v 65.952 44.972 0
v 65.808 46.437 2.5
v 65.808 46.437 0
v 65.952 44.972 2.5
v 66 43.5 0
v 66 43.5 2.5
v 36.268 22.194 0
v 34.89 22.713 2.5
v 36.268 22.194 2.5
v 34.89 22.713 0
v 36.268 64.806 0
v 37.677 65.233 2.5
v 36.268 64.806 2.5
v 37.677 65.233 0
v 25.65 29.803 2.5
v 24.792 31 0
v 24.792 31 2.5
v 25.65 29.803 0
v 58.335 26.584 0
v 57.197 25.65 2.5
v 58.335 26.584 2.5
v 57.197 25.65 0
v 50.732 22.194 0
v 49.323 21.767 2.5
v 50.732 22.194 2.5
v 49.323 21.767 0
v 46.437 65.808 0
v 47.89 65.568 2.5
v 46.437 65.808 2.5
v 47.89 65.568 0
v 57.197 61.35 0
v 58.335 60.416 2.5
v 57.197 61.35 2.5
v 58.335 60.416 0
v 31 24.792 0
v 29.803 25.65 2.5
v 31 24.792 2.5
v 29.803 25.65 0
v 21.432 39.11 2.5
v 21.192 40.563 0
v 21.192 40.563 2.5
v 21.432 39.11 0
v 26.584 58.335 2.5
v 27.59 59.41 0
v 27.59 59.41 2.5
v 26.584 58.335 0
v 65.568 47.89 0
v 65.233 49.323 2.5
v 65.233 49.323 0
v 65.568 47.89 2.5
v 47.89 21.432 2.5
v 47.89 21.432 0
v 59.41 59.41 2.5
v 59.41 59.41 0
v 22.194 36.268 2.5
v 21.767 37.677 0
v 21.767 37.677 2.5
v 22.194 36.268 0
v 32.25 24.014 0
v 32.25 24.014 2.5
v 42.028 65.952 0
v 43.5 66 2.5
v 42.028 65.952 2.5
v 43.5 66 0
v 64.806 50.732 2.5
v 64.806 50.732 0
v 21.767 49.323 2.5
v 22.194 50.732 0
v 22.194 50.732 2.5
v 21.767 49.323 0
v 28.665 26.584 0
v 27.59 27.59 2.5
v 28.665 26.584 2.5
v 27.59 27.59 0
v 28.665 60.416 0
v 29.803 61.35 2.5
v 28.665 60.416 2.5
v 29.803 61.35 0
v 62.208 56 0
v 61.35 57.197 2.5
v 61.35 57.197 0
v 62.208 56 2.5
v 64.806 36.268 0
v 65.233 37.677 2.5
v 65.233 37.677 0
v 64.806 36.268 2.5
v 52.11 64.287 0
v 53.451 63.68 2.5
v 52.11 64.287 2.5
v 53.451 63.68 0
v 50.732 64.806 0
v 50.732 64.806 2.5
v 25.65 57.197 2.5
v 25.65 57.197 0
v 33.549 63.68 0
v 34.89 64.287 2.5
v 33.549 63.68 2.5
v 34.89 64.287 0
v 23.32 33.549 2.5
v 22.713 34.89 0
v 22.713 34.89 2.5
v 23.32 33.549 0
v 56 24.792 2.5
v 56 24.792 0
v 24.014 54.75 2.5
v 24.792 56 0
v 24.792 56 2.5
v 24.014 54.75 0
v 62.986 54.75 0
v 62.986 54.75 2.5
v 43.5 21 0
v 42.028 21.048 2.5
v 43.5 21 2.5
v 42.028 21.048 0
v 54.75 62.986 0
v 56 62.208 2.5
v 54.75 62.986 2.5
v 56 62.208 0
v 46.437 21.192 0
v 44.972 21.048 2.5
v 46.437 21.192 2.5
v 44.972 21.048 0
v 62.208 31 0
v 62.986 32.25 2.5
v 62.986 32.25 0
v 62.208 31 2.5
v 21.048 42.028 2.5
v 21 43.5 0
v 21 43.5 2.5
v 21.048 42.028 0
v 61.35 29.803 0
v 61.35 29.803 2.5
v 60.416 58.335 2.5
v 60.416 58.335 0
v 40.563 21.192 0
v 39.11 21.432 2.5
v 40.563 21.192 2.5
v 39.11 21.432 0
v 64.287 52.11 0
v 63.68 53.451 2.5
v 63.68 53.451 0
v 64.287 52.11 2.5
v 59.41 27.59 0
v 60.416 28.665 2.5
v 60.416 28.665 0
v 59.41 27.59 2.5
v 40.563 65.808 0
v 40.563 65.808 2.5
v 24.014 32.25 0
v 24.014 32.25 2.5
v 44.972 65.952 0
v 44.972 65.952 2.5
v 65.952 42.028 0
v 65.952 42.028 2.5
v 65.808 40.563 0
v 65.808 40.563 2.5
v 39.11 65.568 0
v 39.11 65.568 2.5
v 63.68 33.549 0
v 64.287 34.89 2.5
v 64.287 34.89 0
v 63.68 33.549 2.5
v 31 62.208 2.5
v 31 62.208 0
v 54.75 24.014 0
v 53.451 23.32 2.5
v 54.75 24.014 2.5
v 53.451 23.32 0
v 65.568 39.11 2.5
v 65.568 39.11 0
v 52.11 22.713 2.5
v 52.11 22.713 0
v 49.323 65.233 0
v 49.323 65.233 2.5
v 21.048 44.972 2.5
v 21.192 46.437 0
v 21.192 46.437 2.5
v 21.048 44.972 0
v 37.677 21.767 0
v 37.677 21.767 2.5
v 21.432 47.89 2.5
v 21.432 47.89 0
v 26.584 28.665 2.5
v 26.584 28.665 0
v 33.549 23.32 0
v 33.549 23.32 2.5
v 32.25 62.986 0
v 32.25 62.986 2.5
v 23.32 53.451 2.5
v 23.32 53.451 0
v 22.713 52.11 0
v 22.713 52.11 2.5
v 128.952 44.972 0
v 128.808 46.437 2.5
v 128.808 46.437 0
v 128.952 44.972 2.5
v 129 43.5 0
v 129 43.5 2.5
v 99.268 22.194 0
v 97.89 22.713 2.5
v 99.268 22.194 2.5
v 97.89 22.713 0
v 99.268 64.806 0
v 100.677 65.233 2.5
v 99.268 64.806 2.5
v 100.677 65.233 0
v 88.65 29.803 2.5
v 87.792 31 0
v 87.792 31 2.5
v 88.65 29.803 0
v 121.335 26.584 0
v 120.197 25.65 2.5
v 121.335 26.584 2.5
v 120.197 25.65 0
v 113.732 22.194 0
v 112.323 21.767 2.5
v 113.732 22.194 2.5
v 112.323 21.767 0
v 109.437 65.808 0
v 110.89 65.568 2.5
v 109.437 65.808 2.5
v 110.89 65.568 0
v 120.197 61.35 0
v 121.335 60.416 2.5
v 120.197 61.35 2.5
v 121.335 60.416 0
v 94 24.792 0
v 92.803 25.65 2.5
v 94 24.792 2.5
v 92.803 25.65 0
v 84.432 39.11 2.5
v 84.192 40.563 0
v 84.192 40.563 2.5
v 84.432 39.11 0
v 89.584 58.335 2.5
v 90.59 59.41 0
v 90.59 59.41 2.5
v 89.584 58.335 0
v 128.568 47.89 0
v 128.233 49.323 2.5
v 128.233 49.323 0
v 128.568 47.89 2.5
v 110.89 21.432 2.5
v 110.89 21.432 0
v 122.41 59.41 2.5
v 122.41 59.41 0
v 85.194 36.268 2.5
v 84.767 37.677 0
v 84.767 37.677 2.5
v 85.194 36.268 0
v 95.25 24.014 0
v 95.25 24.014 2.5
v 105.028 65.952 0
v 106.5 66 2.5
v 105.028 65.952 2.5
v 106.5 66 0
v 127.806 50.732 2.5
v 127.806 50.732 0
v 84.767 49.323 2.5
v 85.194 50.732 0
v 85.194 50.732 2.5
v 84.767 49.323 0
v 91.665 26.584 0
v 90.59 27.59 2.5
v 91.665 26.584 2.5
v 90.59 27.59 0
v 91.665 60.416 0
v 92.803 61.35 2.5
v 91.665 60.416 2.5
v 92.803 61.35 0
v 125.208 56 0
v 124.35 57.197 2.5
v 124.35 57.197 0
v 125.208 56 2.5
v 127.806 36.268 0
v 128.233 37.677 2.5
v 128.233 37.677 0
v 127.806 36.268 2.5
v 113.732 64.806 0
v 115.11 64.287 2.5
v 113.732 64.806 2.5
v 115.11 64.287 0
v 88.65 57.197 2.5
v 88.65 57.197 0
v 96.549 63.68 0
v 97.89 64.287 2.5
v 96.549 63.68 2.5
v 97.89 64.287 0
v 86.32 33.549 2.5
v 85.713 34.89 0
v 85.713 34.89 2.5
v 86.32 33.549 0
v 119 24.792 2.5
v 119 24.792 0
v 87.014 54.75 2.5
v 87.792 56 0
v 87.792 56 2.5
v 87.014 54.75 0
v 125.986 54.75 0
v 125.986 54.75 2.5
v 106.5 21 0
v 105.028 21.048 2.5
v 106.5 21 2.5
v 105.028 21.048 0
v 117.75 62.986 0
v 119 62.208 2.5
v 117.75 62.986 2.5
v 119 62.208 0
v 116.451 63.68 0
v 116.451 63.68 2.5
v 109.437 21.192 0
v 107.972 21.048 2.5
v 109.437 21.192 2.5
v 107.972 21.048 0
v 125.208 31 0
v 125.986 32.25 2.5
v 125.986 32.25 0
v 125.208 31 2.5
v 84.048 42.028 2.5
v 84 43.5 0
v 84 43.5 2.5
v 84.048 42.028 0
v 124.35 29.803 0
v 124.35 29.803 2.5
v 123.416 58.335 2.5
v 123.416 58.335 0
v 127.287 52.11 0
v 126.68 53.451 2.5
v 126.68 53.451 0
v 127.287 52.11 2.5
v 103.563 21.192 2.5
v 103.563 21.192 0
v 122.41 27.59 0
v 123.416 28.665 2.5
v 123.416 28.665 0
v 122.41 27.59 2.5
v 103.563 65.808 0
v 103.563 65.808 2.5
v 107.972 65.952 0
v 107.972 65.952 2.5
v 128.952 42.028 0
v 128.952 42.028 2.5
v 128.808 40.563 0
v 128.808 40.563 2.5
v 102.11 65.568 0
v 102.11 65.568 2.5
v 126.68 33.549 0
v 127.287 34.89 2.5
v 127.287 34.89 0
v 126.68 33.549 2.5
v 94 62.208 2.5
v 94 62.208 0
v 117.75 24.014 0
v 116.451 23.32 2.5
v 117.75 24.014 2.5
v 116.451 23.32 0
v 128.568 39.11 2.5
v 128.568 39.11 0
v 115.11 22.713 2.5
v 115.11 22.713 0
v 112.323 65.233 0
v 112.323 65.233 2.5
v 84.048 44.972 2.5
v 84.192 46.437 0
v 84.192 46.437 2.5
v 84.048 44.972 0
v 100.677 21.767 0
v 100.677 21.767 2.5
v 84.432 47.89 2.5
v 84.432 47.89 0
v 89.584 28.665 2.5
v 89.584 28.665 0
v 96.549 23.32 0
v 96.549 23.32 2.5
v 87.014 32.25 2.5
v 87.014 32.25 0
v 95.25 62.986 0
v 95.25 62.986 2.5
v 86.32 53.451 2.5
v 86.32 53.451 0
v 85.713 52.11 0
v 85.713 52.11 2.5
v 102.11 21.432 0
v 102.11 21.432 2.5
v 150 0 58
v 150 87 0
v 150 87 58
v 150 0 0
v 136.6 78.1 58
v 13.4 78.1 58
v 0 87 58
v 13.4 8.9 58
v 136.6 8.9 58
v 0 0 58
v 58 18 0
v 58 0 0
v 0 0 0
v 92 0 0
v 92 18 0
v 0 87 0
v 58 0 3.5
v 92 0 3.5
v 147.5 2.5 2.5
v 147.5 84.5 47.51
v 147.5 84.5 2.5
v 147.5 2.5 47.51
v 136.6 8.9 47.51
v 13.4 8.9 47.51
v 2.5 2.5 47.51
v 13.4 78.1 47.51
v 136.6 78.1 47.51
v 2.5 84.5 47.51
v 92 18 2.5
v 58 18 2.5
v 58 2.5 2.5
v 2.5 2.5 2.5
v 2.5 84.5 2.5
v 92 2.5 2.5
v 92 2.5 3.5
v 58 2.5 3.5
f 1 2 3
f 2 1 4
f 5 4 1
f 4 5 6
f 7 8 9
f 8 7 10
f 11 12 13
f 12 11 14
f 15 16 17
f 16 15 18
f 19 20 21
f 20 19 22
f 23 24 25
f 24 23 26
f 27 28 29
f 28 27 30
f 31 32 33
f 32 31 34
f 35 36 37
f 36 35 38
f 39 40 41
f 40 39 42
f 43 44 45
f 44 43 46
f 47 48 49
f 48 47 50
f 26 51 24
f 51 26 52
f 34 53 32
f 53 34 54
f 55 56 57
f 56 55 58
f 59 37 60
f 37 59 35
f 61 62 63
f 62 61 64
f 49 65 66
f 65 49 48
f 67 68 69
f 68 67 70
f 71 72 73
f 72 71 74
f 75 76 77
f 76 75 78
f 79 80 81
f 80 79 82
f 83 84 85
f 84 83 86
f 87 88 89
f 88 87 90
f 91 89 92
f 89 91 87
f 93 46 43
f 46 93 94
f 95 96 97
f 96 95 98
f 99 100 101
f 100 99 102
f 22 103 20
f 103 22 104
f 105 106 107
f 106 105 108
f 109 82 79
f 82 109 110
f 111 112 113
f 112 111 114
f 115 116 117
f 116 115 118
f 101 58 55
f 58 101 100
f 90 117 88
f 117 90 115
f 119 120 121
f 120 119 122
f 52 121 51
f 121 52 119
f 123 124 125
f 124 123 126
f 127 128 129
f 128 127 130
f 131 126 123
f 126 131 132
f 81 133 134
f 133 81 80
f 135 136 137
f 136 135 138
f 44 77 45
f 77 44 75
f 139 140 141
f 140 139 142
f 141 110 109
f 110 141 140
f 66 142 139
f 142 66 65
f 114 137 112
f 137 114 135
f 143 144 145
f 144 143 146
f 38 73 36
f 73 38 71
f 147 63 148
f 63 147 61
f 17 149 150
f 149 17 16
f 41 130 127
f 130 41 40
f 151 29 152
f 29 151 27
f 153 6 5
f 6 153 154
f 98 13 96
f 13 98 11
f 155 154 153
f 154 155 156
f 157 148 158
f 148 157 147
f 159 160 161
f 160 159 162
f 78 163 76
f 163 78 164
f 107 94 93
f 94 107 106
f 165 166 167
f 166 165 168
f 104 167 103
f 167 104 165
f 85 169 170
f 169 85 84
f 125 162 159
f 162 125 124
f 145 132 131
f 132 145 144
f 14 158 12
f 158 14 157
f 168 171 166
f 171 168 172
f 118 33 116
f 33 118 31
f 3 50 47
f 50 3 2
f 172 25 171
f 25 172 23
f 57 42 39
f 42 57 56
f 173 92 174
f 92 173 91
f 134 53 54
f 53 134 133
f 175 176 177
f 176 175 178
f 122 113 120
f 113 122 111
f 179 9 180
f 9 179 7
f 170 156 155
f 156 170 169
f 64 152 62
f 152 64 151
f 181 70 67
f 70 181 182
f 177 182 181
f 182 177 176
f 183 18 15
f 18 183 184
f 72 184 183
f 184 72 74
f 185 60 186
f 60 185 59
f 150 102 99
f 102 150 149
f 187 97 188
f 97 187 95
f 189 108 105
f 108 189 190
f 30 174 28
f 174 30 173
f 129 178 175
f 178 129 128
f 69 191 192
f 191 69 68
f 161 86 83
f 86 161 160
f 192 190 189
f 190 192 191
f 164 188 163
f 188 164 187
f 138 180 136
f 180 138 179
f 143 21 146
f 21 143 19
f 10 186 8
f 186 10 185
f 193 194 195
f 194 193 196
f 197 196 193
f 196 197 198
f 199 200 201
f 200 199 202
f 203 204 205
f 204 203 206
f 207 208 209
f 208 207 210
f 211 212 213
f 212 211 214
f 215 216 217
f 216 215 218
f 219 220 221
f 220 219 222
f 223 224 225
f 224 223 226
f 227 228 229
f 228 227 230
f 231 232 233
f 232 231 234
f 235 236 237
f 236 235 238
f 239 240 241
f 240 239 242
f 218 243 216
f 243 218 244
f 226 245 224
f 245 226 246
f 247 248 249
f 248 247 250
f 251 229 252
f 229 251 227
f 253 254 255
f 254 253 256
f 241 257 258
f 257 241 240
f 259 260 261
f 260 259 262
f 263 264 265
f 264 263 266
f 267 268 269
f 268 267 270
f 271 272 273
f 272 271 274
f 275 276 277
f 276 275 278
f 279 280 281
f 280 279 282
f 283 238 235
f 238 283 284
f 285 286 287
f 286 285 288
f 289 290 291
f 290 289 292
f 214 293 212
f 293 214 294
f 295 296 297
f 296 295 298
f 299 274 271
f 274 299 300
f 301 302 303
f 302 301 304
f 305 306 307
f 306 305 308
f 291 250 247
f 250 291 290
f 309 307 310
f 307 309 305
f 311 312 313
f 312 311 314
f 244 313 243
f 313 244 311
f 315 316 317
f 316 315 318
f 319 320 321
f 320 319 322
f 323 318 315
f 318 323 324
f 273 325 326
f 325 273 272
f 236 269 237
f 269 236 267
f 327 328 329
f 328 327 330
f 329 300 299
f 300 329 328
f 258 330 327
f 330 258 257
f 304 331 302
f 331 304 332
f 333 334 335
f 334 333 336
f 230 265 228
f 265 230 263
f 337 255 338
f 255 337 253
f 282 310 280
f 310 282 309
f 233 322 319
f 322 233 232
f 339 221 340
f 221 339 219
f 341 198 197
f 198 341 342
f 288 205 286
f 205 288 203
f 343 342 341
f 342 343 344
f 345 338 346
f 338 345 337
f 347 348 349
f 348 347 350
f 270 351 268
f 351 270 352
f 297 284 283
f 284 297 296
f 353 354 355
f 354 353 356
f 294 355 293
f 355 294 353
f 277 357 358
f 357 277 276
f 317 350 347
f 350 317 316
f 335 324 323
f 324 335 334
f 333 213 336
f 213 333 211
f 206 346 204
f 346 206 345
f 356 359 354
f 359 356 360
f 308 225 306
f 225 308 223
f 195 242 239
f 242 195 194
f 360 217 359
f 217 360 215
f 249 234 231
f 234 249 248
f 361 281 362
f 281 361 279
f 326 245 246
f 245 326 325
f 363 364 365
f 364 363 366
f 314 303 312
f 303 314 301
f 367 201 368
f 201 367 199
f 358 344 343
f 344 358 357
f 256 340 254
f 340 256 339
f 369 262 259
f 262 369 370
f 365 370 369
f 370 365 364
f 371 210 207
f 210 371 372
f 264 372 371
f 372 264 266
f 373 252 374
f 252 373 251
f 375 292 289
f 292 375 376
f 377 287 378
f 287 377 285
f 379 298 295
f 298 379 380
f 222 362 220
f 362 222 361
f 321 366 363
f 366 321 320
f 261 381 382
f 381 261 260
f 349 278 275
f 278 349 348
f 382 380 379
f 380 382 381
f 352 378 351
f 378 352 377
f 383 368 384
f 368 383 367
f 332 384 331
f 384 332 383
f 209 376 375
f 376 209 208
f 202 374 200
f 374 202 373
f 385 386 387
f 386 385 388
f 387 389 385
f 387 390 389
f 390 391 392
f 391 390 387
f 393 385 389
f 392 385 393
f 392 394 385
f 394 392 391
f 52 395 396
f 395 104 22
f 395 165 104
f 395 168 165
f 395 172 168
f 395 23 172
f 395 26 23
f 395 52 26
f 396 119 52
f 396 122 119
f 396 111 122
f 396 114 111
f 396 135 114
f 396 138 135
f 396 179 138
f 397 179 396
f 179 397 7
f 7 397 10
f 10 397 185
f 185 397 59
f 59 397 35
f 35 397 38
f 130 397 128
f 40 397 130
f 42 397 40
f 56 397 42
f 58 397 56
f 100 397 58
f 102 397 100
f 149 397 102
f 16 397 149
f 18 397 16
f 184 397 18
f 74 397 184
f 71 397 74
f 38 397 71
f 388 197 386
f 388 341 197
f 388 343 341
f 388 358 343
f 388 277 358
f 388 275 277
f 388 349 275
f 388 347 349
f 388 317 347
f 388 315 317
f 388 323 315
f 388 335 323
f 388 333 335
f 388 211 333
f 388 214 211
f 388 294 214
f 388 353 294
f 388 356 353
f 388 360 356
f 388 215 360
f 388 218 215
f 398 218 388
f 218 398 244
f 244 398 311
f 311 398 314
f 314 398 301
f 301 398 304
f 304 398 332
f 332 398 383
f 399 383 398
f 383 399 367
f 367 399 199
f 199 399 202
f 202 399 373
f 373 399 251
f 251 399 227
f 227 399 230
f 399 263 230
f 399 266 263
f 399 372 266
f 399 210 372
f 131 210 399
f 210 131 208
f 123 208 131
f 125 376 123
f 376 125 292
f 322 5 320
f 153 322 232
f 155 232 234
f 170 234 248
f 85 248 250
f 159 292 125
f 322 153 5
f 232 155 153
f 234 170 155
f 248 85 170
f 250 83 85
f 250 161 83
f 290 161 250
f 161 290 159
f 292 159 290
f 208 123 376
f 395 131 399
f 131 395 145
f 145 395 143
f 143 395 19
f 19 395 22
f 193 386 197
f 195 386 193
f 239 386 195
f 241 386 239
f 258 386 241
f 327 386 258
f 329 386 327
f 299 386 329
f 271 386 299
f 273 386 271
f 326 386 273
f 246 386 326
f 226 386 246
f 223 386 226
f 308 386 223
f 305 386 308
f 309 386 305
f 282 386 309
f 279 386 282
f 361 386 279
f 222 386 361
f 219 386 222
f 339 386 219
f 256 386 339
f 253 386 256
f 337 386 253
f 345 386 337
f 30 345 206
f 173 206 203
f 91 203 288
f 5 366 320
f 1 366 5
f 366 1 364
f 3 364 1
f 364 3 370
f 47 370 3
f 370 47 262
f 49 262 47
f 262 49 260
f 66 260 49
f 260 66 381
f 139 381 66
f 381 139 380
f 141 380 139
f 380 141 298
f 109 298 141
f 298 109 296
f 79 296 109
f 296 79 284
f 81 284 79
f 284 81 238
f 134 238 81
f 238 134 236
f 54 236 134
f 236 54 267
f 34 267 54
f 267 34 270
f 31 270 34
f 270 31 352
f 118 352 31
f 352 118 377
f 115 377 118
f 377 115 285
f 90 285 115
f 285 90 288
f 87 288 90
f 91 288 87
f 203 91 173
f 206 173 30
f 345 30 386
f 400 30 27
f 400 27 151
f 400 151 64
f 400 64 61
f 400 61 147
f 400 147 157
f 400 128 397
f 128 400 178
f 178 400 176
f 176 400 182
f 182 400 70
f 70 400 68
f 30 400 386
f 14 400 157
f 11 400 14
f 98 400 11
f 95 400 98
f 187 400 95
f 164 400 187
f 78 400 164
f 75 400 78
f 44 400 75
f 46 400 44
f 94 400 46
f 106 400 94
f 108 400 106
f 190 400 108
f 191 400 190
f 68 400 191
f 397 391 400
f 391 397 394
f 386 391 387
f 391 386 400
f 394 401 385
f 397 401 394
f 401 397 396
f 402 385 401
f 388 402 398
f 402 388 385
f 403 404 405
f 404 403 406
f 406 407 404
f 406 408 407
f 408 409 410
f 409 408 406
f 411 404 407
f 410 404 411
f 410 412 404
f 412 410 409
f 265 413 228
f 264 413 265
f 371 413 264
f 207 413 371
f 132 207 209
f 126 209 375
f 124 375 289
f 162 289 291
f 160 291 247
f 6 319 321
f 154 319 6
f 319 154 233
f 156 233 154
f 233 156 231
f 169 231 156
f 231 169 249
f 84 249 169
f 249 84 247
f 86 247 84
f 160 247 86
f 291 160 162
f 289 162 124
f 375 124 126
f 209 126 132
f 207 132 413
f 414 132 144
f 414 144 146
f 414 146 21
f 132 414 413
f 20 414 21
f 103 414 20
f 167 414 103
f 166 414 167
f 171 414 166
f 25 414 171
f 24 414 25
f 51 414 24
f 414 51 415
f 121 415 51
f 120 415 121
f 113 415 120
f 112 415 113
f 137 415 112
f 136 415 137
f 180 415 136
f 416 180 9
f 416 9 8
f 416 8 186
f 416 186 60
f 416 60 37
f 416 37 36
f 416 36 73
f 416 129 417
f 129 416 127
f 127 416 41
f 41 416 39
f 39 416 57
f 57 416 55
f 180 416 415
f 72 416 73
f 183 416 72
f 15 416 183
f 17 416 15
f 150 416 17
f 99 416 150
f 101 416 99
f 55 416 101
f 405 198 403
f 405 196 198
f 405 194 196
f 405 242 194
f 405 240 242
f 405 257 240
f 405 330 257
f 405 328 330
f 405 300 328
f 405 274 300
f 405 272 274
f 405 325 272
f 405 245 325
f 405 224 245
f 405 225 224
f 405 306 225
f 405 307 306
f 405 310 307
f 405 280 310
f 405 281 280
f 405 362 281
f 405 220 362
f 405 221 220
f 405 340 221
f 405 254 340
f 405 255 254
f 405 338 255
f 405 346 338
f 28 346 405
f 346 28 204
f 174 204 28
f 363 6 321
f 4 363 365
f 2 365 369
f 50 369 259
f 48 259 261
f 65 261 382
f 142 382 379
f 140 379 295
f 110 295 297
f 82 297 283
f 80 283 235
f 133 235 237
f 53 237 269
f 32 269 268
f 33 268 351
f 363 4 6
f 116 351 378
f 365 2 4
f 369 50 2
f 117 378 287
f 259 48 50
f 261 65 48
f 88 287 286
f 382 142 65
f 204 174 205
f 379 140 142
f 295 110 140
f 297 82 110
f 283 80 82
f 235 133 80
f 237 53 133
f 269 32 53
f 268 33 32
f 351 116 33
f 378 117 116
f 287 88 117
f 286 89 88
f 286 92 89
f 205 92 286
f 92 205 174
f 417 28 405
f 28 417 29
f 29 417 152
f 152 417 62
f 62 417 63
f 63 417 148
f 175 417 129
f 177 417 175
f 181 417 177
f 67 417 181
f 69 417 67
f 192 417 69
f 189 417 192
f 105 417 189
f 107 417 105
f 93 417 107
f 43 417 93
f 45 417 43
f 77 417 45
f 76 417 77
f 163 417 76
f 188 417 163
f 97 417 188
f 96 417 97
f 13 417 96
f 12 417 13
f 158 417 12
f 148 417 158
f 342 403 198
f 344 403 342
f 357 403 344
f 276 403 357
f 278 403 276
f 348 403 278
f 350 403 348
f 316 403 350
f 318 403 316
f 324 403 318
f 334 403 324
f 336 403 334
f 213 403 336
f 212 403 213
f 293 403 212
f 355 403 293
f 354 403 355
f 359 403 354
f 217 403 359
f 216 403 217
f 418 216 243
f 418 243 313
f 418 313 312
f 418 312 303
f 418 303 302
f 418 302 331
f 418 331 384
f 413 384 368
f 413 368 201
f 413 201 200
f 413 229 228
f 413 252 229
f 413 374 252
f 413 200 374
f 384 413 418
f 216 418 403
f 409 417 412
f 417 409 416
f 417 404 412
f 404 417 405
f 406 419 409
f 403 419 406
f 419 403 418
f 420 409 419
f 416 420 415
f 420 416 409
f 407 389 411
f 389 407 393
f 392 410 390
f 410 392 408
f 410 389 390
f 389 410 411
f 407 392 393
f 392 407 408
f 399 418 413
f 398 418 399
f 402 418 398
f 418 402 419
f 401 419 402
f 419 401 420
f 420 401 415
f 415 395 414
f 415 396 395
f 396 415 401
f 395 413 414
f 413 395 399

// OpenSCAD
// ELF VR - parametric headset shell (Phase 0 prototype)
//
// 단순한 박스형 셸입니다. 앞면 플레이트에 렌즈 구멍 2개(IPD 간격), 뒤쪽에 패널 포켓,
// 아래쪽 가운데에 코 절개부가 있습니다. 패널은 뒤에서 삽입하며 렌즈 평면에서
// lens_to_panel 만큼 떨어진 곳의 선반(ledge)에 놓입니다.
//
// 좌표계 (mm):
//   X: 가로 (0 ~ face_w)
//   Y: 세로 (0 = 셸 아랫면)
//   Z: 깊이 (0 = 얼굴 쪽 면, depth = 뒤쪽 면)
//      렌즈 플레이트는 Z 0 ~ wall, 패널 앞면은 Z = wall + lens_to_panel.
//
// 렌더링/내보내기는 hardware/README.md 를 참고하세요.

/* [Display panel] */
// 패널 외곽 가로 길이 (실측 후 입력)
panel_w = 122;
// 패널 외곽 세로 길이
panel_h = 68;
// 패널 + 드라이버 보드 두께
panel_t = 8;
// 패널 포켓 여유 간격 (인쇄 공차)
clearance = 0.6;

/* [Optics] */
// 렌즈 외경
lens_d = 44;
// 렌즈 구멍 직경 (렌즈보다 약간 크게)
lens_hole_extra = 1.0;
// 렌즈 평면에서 패널 앞면까지 거리 (초점 거리에 맞춰 조정)
lens_to_panel = 45;
// 두 렌즈 중심 간격 (IPD)
ipd = 63;

/* [Shell] */
// 벽 두께
wall = 2.5;
// 셸 전체 가로 길이 (face width)
face_w = 150;
// 상하 여유 (스트랩 및 여백)
vertical_margin = 14;

/* [Nose cutout] */
// 코 절개부 가로 길이
nose_w = 34;
// 코 절개부 높이 (아랫면부터)
nose_h = 18;

/* [Render quality] */
$fn = 96;

// --- 파생 값 (직접 수정하지 마세요) ---
lens_hole_d = lens_d + lens_hole_extra;
shell_h = panel_h + 2 * wall + vertical_margin;
shell_d = wall + lens_to_panel + panel_t + wall;

// 설정값 확인용 출력
echo(str("ELF shell: ", face_w, " x ", shell_h, " x ", shell_d, " mm, IPD ", ipd, " mm"));

// 외곽 박스
module outer_body() {
    cube([face_w, shell_h, shell_d]);
}

// 렌즈 플레이트 뒤쪽 눈/광학 공간 (렌즈와 패널 사이)
module optical_cavity() {
    translate([wall, wall, wall])
        cube([face_w - 2 * wall, shell_h - 2 * wall, lens_to_panel + 0.01]);
}

// 패널 포켓: 패널 앞면 평면부터 뒤쪽 끝까지 뚫어 뒤에서 삽입
module panel_pocket() {
    pw = panel_w + 2 * clearance;
    ph = panel_h + 2 * clearance;
    translate([(face_w - pw) / 2, (shell_h - ph) / 2, wall + lens_to_panel])
        cube([pw, ph, shell_d]);
}

// 렌즈 구멍 2개, IPD 간격, 셸 세로 중앙
module lens_holes() {
    for (sx = [-1, 1])
        translate([face_w / 2 + sx * ipd / 2, shell_h / 2, -1])
            cylinder(d = lens_hole_d, h = wall + 2);
}

// 코 절개부: 아랫면 가운데, 앞면 플레이트만 관통
module nose_cutout() {
    translate([(face_w - nose_w) / 2, -1, -1])
        cube([nose_w, nose_h + 1, wall + 2]);
}

difference() {
    outer_body();
    optical_cavity();
    panel_pocket();
    lens_holes();
    nose_cutout();
}
